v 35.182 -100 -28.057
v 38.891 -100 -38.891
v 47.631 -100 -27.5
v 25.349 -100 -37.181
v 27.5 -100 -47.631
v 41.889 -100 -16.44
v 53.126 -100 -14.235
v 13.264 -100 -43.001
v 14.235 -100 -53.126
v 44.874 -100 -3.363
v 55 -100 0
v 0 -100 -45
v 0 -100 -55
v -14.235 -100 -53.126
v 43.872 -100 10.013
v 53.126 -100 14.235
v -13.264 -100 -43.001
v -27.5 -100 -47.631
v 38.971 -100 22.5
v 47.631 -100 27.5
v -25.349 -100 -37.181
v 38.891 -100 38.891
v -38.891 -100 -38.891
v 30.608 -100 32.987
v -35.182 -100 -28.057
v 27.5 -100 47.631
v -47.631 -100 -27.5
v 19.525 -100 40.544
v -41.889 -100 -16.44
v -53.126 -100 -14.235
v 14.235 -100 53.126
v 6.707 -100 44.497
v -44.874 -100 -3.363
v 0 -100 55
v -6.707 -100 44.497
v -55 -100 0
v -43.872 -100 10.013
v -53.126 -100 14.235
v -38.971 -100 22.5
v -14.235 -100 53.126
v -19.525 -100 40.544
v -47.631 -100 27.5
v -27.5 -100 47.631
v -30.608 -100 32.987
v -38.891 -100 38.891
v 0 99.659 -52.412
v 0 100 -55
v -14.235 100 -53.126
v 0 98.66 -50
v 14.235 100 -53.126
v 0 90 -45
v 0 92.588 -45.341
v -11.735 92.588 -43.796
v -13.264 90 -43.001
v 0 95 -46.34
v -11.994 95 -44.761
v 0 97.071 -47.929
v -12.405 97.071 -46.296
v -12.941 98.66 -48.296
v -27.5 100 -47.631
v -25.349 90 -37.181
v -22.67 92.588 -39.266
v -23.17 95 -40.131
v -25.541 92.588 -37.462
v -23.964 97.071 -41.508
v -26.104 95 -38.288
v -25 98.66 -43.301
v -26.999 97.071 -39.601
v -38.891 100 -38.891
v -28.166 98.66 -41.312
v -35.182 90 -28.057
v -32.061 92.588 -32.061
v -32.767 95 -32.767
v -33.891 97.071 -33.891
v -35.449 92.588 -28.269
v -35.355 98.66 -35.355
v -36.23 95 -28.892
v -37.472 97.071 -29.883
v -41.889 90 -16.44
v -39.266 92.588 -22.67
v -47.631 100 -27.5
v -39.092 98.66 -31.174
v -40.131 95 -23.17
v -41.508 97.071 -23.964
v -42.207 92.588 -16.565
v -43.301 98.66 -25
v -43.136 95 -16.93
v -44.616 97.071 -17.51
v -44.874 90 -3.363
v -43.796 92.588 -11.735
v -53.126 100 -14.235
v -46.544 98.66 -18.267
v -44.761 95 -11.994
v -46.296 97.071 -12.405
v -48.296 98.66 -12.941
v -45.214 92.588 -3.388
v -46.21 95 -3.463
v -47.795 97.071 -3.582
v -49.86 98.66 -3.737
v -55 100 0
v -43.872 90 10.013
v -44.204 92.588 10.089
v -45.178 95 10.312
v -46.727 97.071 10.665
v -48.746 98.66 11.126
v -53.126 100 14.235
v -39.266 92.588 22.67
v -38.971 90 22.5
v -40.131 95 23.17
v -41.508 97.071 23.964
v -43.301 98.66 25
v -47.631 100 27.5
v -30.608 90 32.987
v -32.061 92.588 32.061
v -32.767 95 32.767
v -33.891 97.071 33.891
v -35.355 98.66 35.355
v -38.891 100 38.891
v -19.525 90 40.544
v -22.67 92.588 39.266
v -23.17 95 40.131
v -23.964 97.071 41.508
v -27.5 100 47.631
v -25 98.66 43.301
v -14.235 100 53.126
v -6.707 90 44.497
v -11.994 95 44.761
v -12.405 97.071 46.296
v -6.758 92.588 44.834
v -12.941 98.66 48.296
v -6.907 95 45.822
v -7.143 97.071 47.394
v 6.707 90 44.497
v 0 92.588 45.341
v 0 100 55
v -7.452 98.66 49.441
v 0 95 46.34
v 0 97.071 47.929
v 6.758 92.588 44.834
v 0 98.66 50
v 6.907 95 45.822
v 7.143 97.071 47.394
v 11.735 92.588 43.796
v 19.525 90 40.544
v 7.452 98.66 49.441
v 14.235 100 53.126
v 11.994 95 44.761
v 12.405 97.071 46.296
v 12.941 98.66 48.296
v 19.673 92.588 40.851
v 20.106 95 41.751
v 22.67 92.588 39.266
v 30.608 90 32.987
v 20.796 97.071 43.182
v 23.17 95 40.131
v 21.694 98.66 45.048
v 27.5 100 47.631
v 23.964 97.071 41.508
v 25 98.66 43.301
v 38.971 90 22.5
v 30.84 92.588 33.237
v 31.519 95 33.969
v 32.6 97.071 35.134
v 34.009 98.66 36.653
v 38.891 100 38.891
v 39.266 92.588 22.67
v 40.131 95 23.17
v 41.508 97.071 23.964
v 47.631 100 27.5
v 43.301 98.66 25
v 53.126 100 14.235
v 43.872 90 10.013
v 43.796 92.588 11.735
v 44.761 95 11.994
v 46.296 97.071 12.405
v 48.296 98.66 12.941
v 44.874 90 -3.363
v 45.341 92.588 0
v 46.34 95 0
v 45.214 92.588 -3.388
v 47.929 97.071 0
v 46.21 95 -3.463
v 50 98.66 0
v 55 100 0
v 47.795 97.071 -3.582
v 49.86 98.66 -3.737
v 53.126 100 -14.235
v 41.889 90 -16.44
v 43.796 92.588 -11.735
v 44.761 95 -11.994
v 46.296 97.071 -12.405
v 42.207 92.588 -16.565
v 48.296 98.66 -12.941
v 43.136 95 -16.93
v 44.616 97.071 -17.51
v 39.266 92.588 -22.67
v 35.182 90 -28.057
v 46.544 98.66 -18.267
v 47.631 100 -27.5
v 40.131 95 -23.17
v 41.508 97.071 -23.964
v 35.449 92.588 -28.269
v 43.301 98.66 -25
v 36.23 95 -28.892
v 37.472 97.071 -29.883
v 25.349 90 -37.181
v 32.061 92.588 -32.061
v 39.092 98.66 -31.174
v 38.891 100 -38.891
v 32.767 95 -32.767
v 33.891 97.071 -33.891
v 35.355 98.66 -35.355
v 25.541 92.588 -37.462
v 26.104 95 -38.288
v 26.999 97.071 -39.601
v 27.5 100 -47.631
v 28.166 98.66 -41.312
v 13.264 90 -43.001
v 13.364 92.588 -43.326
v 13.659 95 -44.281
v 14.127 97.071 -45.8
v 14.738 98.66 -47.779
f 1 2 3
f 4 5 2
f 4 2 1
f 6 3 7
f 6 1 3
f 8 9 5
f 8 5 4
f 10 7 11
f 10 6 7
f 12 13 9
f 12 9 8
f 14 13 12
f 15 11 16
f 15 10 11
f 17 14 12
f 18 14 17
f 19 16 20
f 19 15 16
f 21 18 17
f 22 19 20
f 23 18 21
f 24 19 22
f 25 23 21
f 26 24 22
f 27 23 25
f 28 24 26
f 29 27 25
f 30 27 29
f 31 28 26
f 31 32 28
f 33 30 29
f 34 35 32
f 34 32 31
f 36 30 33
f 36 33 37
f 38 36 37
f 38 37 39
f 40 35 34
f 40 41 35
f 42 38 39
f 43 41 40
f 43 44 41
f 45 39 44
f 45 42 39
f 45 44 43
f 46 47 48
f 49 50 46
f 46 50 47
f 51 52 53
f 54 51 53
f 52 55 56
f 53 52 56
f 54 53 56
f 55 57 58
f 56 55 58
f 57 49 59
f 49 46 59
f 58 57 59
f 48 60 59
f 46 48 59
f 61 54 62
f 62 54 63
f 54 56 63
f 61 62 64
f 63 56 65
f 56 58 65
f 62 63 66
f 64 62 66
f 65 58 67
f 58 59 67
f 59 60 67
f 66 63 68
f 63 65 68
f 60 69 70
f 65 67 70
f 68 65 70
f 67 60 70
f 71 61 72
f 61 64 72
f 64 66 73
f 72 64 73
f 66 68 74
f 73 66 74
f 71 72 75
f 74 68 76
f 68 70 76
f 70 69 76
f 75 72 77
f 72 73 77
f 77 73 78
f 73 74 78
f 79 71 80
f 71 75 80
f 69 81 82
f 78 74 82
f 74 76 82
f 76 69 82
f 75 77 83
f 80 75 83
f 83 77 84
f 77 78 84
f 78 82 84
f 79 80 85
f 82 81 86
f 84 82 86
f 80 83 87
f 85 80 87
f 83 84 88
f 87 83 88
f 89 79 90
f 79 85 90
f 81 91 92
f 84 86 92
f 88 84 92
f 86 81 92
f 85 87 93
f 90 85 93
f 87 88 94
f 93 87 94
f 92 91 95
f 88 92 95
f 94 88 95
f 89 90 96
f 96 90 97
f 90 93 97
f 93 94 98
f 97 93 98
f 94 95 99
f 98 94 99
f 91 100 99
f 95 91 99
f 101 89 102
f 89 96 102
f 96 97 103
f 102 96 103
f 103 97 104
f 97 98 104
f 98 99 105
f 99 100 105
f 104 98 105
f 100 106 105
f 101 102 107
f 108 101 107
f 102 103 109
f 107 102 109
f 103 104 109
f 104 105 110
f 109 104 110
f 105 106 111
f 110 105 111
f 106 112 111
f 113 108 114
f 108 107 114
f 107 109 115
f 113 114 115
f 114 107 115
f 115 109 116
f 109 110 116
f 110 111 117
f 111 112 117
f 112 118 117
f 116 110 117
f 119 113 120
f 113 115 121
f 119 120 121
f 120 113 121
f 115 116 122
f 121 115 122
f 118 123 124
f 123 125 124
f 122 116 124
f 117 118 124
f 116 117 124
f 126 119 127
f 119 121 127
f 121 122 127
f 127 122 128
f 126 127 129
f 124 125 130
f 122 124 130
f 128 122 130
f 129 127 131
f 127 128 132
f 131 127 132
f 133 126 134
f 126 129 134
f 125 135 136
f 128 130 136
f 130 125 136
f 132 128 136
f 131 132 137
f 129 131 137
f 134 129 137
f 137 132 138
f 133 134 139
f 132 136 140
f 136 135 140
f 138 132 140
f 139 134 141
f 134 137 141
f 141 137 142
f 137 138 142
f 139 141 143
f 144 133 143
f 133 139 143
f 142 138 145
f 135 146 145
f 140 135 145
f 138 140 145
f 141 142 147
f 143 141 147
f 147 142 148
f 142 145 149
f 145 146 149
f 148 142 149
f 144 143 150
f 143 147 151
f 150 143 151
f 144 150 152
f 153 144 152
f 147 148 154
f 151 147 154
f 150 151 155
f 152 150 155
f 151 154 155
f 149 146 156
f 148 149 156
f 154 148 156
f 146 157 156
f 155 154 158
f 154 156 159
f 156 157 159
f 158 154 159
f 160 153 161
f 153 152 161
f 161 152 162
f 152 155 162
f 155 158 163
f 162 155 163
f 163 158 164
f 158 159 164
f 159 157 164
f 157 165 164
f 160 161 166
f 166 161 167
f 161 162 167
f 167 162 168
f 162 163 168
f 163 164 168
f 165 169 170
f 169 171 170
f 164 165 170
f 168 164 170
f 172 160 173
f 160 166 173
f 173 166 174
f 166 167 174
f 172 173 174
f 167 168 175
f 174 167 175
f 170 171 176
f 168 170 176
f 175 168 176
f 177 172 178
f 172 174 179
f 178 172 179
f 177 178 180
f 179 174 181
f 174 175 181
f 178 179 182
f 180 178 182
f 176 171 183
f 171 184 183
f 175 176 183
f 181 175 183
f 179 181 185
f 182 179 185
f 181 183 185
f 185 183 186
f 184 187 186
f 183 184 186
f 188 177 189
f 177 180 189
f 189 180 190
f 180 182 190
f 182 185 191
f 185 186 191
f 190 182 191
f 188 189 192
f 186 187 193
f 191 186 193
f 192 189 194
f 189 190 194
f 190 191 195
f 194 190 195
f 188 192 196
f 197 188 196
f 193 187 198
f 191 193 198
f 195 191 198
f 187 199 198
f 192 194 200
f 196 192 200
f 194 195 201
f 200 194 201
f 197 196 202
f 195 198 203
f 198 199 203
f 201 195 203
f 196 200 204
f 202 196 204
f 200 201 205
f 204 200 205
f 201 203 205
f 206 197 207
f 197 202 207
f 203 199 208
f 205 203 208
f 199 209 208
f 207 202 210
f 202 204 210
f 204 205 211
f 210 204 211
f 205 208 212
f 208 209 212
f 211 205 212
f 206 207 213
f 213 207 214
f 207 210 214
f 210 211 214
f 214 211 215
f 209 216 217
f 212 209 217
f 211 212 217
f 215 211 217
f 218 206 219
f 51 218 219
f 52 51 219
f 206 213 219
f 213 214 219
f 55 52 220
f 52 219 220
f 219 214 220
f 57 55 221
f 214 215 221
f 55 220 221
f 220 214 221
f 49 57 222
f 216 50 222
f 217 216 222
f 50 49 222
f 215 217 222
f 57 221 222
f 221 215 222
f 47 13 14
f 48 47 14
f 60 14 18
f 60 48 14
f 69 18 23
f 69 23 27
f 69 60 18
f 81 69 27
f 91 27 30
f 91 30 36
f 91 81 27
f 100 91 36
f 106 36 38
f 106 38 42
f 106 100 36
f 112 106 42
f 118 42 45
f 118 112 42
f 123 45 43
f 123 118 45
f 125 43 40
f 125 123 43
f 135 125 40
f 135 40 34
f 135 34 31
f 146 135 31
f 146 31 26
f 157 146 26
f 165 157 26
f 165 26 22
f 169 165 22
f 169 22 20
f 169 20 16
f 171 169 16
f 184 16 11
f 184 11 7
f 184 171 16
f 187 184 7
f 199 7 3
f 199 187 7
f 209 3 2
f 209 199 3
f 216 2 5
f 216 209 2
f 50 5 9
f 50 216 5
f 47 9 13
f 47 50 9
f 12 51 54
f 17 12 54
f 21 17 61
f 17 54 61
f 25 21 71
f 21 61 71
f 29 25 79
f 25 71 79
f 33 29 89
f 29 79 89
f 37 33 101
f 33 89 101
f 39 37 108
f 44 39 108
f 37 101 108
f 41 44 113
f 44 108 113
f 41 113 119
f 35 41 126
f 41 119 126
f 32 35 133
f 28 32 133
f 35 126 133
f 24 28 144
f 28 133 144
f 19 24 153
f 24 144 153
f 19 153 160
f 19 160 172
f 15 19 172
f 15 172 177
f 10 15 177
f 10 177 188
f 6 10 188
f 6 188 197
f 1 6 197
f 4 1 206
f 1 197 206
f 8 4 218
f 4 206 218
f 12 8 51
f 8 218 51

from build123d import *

# Parameters (mm, degrees)
SKETCH_1_W = 10
SKETCH_1_H = 200
FILLET_2_R = 10


with BuildPart() as part:
    # Эскиз1 → Повернуть1 (revolve)
    with BuildSketch(Plane.XY, mode=Mode.PRIVATE) as revolve_1_sk:
        with Locations((50, 0)):
            Rectangle(SKETCH_1_W, SKETCH_1_H)
    revolve(revolve_1_sk.sketch.rotate(Axis((0, -110.603092707, 0), (0, 1, 0)), 90), axis=Axis((0, -110.603092707, 0), (0, 1, 0)))

    # Скругление2
    fillet_2_edges = [part.edges().sort_by_distance(p)[0] for p in [
        (0, 100, 45),
    ]]
    fillet(fillet_2_edges, radius=FILLET_2_R - 0.0001)  # a hair under: the kernel refuses the full size


solid = part.part
